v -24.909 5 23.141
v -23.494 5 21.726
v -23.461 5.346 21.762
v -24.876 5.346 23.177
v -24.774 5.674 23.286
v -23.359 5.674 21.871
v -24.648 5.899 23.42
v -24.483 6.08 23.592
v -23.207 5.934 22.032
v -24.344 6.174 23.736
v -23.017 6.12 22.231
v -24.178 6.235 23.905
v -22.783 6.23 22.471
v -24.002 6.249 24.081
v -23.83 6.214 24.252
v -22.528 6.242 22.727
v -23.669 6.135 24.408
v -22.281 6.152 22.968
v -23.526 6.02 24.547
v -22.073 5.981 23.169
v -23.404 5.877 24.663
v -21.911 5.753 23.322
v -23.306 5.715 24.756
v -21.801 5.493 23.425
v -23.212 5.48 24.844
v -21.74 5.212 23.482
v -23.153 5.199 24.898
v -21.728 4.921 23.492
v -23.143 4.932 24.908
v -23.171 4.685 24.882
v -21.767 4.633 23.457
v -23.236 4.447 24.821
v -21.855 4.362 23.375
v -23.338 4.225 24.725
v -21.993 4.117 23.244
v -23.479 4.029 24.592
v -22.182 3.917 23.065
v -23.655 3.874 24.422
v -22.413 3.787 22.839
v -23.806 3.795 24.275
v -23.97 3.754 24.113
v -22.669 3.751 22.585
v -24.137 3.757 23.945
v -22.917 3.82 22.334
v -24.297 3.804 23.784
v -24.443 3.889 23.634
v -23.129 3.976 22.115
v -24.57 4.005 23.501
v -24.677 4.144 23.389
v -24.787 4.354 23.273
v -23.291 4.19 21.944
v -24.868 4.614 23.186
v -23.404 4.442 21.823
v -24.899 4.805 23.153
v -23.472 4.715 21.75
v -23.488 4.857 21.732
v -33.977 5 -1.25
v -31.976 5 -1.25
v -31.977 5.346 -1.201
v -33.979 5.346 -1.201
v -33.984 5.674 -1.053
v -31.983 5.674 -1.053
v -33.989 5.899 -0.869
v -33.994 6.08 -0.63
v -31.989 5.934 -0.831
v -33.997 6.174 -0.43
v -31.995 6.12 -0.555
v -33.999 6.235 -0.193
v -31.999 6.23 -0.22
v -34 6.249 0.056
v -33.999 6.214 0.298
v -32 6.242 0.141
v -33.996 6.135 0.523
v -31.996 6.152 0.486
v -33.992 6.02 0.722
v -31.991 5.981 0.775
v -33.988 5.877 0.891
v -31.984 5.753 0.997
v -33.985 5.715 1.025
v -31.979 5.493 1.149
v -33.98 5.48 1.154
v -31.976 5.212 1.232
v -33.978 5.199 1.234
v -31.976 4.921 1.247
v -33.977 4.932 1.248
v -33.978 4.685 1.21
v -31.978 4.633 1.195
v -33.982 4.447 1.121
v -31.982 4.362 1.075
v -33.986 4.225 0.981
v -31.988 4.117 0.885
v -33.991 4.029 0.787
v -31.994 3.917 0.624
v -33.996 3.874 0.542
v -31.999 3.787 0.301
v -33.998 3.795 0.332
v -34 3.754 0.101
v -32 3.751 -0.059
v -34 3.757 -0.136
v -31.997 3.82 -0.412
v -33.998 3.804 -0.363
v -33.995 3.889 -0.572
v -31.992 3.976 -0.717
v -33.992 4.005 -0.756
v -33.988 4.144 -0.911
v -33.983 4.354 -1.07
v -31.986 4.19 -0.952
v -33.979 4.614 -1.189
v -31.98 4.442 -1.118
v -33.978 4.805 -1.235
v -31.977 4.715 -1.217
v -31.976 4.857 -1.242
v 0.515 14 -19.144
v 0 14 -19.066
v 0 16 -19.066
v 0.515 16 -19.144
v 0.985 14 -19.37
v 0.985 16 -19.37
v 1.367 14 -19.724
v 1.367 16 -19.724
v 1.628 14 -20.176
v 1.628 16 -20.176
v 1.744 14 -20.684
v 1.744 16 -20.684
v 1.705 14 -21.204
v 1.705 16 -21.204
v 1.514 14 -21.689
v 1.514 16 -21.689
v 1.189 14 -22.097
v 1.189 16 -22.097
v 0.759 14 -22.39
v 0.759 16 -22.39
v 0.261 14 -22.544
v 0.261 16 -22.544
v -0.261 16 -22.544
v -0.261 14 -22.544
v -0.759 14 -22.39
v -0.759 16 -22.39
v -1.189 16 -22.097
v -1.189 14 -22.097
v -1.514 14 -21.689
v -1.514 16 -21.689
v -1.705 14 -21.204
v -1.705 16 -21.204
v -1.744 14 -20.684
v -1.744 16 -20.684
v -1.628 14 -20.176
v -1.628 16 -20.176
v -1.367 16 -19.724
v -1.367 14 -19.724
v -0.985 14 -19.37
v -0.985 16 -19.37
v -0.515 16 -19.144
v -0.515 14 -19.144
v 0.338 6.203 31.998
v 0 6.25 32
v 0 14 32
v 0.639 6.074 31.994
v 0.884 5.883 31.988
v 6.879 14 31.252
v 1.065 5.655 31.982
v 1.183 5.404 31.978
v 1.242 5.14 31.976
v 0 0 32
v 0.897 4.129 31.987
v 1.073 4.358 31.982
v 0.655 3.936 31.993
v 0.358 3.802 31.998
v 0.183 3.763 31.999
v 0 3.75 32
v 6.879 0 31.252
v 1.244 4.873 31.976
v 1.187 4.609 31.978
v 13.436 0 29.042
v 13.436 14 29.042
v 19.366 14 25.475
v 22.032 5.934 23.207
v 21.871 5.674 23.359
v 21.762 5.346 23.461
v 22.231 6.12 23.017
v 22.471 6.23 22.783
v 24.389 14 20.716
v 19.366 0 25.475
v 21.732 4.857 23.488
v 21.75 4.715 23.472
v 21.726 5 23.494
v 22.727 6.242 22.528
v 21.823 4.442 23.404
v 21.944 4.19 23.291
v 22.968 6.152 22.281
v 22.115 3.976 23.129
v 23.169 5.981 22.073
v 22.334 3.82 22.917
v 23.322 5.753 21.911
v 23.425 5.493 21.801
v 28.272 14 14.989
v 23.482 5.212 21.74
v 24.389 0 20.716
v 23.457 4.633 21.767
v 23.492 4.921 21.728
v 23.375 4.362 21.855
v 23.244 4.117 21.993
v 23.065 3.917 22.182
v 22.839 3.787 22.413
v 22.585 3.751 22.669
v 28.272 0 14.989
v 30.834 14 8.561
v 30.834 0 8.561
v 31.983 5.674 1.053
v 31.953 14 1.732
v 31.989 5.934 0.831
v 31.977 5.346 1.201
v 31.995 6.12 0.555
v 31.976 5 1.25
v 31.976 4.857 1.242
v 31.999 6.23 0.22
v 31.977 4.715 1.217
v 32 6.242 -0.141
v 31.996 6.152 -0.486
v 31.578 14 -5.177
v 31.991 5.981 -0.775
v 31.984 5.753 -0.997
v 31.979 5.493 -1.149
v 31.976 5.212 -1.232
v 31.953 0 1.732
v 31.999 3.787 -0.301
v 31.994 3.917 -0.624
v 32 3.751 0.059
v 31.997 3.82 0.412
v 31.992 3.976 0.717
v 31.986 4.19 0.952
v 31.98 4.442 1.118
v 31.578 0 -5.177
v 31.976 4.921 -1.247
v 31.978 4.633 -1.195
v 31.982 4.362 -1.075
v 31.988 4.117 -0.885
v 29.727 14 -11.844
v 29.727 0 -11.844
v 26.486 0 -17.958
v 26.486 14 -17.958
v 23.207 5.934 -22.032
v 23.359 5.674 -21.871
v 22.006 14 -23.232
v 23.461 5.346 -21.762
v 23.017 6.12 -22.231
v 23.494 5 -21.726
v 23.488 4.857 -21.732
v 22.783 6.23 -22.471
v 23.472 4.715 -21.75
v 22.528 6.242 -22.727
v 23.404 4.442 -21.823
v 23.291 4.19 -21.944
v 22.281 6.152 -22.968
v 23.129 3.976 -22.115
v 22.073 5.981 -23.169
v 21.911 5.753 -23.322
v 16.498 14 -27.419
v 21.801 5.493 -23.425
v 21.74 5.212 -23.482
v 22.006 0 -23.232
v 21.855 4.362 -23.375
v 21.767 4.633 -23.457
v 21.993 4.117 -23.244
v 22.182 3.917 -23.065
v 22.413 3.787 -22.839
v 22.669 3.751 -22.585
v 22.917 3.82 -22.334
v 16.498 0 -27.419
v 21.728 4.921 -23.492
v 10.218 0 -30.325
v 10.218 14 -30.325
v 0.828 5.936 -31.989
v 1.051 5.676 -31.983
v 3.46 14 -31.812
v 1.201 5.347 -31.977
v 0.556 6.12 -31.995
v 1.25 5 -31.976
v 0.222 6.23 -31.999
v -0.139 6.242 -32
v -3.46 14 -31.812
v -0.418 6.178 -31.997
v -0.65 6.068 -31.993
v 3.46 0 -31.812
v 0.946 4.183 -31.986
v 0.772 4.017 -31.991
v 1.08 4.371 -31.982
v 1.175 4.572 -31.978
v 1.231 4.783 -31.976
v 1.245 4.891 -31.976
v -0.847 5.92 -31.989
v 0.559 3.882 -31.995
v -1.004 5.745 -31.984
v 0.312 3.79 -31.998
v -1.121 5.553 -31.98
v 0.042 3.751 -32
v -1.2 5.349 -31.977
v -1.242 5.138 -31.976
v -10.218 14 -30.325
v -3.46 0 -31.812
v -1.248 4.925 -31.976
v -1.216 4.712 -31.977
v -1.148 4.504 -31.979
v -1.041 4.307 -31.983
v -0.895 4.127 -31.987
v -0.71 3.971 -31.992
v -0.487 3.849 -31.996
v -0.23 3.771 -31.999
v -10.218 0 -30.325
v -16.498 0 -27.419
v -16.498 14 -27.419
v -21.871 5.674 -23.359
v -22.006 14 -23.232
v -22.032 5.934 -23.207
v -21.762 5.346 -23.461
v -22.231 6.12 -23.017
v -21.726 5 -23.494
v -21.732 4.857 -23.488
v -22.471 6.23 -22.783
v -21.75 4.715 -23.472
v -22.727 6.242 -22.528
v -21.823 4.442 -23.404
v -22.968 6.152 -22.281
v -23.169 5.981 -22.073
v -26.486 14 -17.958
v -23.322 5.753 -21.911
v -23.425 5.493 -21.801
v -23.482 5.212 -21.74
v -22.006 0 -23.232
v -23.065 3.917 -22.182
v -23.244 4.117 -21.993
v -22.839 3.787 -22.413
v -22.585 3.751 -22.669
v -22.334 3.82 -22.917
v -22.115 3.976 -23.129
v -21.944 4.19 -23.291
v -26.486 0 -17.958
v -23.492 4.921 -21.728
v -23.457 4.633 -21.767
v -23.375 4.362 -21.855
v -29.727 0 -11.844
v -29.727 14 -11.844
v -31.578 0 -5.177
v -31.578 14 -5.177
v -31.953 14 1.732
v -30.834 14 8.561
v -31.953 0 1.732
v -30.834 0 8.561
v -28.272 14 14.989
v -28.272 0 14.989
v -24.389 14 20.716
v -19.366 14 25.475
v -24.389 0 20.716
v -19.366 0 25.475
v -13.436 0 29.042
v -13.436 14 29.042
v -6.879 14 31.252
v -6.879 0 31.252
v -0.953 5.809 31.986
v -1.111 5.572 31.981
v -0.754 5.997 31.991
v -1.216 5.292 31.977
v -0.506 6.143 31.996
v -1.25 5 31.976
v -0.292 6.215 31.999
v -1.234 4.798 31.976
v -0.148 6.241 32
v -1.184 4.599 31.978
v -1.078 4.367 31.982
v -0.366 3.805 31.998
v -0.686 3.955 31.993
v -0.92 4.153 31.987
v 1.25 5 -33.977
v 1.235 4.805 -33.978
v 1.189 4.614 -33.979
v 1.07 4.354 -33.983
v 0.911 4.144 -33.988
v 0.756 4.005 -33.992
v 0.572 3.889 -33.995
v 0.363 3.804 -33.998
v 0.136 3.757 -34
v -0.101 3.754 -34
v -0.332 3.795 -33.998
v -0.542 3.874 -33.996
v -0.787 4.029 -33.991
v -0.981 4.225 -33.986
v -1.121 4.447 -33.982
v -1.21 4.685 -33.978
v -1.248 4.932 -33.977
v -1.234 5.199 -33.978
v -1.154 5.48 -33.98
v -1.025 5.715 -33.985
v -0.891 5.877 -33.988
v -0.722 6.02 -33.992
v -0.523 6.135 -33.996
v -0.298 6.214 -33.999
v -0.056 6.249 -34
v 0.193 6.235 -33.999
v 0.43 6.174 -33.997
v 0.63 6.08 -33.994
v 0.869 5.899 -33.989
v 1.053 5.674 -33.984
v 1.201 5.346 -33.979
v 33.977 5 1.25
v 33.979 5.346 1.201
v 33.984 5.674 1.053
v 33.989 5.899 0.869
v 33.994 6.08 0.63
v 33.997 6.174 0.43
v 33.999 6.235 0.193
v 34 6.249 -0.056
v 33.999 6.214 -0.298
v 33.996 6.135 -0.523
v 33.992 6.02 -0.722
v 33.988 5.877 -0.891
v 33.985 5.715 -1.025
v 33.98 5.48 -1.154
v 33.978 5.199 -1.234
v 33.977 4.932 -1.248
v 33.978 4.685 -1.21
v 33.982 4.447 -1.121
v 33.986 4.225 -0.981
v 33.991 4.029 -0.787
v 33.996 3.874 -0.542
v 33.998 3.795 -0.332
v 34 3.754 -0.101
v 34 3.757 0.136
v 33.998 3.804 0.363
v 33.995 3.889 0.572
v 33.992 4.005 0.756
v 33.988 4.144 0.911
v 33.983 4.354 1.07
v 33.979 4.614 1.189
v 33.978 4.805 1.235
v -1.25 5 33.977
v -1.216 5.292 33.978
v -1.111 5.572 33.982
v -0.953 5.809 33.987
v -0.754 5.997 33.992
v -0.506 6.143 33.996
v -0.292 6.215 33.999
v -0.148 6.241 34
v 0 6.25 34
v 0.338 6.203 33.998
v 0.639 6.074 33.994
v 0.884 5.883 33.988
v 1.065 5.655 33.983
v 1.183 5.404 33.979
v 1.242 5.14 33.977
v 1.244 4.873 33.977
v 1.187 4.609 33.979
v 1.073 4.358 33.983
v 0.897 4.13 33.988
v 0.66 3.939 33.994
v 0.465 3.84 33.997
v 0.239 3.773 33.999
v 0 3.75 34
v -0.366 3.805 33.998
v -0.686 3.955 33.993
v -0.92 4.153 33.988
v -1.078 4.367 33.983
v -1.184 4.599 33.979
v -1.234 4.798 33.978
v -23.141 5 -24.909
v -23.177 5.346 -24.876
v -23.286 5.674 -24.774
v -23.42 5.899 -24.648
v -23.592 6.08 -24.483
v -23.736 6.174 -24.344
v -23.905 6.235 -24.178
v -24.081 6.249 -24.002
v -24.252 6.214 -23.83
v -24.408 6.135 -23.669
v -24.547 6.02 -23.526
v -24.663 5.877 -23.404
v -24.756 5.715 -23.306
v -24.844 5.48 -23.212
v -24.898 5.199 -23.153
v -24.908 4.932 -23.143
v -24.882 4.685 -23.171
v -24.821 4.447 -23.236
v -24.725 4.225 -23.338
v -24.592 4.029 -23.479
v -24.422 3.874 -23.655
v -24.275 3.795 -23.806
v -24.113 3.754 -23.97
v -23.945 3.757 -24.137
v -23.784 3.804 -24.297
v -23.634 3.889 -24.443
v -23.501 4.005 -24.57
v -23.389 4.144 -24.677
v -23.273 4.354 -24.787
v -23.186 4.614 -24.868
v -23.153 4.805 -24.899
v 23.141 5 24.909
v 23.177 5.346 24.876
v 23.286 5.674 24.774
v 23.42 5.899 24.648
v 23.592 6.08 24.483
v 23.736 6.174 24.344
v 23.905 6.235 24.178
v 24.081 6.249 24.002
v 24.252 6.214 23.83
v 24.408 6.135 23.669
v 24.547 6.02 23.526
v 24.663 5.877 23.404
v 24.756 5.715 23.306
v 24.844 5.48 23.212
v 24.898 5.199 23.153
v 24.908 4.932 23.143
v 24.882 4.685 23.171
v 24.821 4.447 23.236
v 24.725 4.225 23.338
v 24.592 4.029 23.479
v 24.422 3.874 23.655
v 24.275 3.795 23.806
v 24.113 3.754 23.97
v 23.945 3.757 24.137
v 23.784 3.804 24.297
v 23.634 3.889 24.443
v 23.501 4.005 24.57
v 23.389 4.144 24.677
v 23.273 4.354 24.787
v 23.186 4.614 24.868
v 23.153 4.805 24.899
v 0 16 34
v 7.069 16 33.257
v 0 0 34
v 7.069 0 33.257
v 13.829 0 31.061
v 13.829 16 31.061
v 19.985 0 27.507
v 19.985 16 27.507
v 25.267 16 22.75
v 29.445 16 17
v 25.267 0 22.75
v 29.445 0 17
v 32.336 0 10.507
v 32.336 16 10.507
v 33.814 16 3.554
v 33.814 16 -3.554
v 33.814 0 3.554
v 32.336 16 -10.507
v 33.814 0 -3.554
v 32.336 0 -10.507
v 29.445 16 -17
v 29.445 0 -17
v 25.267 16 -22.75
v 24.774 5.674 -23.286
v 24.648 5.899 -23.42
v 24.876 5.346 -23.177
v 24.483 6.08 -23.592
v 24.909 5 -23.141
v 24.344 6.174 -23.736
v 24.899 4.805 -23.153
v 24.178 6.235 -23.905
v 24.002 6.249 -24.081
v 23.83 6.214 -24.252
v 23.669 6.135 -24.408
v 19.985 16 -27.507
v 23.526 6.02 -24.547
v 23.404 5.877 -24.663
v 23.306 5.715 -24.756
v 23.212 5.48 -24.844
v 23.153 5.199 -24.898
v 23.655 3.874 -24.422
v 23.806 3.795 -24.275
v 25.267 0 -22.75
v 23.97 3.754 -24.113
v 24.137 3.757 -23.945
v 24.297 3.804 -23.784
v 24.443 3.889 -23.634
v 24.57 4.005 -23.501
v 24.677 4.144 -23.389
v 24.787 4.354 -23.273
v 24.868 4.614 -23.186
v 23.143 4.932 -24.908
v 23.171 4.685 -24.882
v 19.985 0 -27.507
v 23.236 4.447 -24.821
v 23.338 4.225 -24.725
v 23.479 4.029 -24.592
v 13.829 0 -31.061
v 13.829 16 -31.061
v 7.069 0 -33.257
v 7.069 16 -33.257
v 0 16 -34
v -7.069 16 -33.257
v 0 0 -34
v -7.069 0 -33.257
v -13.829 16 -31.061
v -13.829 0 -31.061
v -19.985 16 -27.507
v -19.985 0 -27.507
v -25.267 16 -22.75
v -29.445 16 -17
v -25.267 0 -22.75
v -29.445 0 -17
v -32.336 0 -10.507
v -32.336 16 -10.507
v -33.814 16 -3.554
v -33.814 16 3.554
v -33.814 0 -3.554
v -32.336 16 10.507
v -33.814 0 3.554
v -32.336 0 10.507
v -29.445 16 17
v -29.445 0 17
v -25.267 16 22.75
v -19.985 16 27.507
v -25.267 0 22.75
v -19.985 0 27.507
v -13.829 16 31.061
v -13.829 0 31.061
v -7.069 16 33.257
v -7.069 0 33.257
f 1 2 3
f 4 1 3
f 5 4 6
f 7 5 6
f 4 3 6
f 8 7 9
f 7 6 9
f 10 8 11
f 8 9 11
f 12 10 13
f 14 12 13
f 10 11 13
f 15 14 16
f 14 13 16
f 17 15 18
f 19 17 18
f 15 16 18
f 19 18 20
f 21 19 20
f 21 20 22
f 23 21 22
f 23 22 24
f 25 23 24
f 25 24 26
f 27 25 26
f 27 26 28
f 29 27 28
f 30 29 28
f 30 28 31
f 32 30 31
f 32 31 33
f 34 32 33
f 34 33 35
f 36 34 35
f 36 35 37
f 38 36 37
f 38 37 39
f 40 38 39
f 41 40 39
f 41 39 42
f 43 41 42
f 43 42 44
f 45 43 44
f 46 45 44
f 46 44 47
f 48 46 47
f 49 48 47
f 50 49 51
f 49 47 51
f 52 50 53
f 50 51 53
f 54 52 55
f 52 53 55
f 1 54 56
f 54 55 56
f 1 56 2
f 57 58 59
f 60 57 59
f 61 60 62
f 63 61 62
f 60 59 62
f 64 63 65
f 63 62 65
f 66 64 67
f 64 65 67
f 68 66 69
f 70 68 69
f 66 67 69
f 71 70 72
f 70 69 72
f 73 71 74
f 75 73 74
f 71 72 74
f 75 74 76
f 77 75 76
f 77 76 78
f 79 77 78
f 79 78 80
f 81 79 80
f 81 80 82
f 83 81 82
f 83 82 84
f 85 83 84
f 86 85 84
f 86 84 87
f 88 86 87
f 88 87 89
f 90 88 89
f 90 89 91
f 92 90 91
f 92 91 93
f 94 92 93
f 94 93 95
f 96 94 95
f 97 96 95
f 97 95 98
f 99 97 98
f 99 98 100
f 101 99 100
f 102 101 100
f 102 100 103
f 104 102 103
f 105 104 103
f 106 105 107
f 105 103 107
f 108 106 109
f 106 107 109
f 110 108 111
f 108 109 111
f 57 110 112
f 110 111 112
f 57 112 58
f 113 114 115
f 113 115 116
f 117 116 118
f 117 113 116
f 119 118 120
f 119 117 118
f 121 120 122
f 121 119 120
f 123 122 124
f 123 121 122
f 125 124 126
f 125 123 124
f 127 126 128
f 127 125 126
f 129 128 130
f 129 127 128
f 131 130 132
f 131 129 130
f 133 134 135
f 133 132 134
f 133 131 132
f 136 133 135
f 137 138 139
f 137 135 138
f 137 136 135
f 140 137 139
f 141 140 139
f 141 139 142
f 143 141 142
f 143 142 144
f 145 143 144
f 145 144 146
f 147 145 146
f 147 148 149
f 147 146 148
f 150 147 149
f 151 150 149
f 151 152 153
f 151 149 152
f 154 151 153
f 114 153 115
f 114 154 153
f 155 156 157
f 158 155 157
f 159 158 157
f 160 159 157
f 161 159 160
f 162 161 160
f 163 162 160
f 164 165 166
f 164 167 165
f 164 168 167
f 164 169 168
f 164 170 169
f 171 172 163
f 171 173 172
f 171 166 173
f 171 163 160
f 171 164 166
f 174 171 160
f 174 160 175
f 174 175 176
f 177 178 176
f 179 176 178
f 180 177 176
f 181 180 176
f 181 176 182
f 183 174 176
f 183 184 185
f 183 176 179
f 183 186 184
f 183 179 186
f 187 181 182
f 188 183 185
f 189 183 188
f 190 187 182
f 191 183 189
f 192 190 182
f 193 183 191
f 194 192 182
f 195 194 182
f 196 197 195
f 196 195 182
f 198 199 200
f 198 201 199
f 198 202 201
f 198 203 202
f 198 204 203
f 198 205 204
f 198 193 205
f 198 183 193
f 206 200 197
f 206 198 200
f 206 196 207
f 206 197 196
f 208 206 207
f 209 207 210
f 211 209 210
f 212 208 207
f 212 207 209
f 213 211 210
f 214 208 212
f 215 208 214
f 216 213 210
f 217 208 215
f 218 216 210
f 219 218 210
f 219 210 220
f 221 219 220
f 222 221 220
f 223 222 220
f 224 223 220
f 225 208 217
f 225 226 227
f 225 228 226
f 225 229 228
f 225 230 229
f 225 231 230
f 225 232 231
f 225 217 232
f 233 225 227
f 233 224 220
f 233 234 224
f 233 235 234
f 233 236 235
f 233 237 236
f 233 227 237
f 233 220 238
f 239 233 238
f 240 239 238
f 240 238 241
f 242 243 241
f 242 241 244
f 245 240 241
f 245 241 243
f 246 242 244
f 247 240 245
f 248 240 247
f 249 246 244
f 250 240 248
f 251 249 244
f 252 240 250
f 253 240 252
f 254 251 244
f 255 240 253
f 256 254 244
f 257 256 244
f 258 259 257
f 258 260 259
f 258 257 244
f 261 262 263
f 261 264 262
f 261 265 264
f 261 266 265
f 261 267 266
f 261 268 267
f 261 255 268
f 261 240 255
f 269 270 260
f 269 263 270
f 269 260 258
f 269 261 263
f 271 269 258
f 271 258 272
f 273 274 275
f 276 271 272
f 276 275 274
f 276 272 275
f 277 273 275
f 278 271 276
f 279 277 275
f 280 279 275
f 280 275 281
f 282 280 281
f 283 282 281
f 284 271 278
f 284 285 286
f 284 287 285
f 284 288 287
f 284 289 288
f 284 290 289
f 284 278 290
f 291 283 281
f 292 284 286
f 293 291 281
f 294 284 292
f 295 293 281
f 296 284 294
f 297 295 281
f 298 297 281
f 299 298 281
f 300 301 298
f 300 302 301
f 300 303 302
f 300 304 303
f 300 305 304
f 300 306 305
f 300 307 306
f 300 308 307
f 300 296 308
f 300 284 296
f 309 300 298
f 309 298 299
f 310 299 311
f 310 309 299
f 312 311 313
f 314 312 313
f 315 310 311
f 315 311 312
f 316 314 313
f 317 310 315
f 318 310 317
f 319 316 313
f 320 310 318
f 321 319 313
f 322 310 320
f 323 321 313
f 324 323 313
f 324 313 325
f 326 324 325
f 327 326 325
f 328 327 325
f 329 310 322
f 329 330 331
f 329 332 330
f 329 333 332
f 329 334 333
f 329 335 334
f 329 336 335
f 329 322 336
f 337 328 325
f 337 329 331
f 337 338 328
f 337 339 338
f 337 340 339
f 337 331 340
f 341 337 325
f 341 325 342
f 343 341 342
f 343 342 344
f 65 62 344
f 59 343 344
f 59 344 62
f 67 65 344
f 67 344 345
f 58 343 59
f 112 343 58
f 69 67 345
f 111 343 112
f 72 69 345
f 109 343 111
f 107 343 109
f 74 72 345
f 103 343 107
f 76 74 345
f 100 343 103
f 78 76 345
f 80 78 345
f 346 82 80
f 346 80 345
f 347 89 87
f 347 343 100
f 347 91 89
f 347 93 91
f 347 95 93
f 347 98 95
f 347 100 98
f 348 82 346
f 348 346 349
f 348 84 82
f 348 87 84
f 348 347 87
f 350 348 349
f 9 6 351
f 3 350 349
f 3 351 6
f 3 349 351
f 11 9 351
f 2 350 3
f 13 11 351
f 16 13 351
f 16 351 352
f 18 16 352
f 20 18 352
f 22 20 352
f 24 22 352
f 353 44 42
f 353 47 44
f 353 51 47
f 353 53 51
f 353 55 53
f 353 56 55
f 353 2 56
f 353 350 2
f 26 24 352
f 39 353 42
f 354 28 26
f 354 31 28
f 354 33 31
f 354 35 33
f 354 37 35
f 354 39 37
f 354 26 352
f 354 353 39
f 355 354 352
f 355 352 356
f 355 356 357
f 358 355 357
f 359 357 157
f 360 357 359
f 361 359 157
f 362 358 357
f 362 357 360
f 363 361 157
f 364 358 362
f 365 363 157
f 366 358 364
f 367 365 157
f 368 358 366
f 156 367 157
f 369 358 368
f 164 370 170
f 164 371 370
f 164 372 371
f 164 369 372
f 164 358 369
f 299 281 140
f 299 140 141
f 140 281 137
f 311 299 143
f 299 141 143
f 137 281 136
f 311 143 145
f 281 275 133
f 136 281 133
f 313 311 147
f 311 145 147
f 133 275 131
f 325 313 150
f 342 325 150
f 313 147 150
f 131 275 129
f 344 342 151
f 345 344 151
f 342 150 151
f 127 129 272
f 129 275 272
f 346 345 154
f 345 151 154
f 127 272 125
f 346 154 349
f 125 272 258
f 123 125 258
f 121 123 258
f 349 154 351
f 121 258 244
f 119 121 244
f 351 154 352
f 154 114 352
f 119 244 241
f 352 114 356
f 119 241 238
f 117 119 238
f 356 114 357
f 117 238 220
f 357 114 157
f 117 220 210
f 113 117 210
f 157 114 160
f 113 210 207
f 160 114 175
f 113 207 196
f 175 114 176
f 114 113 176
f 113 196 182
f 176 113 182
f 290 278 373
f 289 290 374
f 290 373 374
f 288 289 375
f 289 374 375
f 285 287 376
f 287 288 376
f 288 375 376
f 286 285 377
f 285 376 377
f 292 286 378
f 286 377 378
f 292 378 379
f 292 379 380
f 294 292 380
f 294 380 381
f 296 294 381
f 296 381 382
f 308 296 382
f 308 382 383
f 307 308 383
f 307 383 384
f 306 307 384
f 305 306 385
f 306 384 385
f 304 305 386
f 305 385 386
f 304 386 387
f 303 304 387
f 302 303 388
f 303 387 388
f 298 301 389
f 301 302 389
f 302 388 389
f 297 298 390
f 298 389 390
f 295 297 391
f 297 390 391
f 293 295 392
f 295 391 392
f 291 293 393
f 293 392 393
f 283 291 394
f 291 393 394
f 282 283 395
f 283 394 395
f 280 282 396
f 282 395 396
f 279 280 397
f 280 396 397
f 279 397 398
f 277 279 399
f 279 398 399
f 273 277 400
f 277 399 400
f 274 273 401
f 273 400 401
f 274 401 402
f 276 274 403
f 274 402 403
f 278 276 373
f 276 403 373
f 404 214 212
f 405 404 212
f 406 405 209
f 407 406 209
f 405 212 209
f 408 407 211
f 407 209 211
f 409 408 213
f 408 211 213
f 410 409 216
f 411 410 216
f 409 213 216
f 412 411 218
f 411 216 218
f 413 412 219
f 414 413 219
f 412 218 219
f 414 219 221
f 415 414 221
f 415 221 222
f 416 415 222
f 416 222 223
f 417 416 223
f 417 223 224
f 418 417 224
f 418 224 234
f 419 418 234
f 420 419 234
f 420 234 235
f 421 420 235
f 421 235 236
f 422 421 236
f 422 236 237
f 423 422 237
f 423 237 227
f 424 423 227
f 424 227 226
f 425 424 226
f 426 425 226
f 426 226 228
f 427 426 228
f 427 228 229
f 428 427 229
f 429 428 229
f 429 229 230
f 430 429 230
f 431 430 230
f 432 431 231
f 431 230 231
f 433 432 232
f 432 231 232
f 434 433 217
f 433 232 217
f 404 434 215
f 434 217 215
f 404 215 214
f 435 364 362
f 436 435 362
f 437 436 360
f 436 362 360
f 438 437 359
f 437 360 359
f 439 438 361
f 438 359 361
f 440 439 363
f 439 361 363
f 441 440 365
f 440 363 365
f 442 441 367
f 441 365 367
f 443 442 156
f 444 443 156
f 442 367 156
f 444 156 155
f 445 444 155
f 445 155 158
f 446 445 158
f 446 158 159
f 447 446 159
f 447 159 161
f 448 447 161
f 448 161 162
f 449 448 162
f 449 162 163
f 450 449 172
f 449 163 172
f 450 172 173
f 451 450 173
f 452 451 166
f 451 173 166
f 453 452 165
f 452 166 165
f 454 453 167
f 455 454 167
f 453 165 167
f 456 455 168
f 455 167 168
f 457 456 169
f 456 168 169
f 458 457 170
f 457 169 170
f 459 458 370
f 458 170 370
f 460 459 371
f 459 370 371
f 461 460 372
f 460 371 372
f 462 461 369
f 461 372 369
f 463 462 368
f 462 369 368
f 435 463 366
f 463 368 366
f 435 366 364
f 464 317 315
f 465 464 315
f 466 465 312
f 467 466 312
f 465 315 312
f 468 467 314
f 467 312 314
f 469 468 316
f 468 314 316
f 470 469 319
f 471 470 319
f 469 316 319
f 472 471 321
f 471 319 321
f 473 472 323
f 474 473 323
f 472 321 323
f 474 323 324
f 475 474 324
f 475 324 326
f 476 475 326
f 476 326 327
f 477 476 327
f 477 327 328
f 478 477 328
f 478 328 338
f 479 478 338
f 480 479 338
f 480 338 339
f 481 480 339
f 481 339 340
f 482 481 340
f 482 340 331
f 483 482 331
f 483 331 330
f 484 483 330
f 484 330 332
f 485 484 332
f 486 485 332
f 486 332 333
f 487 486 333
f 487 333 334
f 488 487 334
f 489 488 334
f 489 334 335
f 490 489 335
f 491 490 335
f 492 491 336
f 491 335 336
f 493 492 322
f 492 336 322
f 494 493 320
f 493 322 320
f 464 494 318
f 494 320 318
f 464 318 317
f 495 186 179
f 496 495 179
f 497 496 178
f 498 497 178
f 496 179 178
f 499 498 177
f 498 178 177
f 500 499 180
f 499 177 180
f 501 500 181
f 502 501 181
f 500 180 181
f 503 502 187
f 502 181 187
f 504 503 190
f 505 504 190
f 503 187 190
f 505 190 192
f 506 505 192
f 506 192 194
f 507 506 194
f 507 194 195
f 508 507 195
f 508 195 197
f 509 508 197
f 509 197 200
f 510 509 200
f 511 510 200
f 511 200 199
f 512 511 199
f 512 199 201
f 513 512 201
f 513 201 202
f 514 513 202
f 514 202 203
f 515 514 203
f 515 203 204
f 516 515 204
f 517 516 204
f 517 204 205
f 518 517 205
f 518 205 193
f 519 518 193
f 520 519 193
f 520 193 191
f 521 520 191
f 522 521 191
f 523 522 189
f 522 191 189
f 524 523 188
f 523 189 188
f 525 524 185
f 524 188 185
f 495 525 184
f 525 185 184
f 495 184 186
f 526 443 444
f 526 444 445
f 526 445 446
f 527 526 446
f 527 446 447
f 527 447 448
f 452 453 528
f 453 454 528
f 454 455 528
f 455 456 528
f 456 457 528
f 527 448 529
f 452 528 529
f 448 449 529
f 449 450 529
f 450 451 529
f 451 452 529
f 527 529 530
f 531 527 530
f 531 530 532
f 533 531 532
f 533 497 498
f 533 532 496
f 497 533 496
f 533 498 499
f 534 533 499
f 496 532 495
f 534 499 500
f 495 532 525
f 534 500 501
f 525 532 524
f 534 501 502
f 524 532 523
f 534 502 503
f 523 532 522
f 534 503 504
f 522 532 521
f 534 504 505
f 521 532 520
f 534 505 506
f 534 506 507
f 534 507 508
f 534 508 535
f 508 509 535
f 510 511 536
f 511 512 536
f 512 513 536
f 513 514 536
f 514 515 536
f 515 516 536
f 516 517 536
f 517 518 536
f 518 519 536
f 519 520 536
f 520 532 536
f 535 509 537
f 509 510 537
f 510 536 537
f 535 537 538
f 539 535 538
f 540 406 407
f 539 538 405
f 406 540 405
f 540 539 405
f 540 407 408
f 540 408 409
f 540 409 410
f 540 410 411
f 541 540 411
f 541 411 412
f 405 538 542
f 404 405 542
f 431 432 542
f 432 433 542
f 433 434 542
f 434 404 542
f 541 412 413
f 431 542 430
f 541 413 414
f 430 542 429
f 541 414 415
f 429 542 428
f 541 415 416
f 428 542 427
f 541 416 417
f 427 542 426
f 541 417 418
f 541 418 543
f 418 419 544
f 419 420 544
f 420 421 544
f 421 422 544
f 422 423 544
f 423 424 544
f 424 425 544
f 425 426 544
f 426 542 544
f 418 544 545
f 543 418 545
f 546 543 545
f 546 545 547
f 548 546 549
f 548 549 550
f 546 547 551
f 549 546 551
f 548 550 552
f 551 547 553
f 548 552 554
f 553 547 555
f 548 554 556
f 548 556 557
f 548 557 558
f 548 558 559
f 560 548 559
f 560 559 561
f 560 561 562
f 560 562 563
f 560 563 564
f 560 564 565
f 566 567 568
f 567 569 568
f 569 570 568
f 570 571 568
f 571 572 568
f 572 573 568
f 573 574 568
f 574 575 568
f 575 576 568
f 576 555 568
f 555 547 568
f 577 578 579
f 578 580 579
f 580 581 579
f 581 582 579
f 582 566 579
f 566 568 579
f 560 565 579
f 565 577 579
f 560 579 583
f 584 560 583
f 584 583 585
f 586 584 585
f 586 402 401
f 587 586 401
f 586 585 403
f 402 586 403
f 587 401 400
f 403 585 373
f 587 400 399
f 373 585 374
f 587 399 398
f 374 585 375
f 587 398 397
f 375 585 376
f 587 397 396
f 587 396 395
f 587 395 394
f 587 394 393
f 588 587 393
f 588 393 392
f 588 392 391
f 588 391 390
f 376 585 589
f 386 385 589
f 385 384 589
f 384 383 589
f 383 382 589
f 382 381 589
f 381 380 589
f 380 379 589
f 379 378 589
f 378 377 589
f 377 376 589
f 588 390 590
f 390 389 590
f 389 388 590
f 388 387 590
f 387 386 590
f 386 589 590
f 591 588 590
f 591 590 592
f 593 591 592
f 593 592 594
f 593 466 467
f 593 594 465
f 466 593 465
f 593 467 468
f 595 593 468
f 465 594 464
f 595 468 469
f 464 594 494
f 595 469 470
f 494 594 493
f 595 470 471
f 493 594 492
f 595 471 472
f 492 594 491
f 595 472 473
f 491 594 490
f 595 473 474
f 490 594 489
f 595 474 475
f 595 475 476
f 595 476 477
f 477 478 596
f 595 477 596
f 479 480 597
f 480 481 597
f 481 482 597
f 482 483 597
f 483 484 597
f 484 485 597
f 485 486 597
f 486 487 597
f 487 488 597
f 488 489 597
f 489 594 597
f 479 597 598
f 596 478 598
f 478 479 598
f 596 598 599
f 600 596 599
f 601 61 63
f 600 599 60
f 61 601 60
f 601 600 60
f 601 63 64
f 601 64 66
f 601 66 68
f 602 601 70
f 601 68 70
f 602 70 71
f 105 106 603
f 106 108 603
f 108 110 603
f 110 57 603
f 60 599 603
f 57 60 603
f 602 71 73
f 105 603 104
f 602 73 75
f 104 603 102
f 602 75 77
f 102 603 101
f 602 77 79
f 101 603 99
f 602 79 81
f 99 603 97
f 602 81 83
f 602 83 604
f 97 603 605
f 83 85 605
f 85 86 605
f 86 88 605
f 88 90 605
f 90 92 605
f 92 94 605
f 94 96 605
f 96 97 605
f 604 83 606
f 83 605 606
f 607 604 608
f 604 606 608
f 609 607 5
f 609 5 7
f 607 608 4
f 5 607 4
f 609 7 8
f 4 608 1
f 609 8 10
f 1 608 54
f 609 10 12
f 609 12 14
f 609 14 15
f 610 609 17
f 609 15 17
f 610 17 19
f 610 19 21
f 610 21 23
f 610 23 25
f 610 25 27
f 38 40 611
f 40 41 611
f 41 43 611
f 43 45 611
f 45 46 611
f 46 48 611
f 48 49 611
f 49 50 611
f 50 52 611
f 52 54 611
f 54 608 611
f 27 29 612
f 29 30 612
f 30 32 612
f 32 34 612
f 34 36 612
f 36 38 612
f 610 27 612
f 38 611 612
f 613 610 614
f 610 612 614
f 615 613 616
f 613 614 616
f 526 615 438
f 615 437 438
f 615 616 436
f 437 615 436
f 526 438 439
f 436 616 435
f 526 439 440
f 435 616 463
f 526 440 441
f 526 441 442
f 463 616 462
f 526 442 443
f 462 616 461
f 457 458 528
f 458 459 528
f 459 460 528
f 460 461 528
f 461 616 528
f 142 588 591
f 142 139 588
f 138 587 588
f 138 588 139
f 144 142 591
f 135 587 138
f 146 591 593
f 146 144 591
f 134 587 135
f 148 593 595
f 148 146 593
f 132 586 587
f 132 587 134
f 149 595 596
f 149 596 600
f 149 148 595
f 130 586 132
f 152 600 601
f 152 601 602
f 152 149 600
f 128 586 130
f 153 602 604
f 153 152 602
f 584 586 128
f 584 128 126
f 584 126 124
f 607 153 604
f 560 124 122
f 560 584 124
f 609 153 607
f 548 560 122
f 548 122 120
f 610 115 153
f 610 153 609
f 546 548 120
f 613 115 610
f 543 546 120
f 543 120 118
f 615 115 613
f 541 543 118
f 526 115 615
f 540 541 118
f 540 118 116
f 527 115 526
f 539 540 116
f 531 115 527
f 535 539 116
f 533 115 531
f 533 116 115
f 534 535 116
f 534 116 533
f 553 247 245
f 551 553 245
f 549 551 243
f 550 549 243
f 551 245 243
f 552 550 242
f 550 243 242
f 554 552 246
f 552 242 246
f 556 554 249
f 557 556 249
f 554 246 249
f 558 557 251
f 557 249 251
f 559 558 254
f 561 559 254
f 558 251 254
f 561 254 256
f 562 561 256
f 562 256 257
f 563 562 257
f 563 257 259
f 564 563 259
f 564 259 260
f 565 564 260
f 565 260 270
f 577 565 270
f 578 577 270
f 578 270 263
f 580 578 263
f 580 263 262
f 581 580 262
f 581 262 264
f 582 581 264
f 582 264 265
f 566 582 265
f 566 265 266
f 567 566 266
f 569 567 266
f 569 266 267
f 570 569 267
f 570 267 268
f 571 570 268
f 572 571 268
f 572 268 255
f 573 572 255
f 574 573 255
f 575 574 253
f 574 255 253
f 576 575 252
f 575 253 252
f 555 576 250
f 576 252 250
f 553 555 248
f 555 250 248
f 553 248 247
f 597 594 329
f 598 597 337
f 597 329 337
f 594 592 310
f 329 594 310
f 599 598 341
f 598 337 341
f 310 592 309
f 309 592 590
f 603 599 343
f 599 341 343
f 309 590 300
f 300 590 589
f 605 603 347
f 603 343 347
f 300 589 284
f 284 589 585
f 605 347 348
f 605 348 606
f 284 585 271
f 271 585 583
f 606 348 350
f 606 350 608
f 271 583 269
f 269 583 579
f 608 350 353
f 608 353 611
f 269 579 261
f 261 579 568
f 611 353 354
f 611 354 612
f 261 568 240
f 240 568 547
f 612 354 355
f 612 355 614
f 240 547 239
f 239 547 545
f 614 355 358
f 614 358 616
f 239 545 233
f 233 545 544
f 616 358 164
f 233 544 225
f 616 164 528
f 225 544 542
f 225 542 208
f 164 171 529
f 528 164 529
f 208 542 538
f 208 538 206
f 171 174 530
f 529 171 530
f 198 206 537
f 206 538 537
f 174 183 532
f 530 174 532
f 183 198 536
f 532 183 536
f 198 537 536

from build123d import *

# Parameters (mm, degrees)
SKETCH_1_R               = 34
EXTRUDE_1_DEPTH          = 16
CUT_EXTRUDE_1_REACH      = 52.675
CUT_EXTRUDE_1_END_RADIUS = 34
SKETCH_2_R               = 1.25
PATTERN_CIRCULAR_1_COUNT = 8
SKETCH_3_R               = 32
CUT_EXTRUDE_2_DEPTH      = 14
SKETCH_5_R               = 1.748779673
CUT_EXTRUDE_3_DEPTH      = 51.675438003


with BuildPart() as part:
    # 草图1 → 凸台-拉伸1 (new body)
    with BuildSketch(Plane(origin=(0, 0, 0), x_dir=(1, 0, 0), z_dir=(0, 1, 0))):
        with Locations(Location((0, 0, 0), (0, 0, 270))):
            Circle(SKETCH_1_R)
    extrude(amount=EXTRUDE_1_DEPTH)

    # 切除-拉伸1: up to this cylinder (the profile starts inside it)
    cut_extrude_1_end = Plane(origin=(0, 5, 0), z_dir=(0, -1, 0)) * Cylinder(CUT_EXTRUDE_1_END_RADIUS, 174.35, mode=Mode.PRIVATE)
    # 草图2 → 切除-拉伸1 (cut, up to the surface)
    with BuildSketch(Plane.XY, mode=Mode.PRIVATE) as cut_extrude_1_sk1:
        with Locations((0, 5)):
            Circle(SKETCH_2_R)
    cut_extrude_1_tool1 = extrude(cut_extrude_1_sk1.sketch, amount=-CUT_EXTRUDE_1_REACH, mode=Mode.PRIVATE) & cut_extrude_1_end
    cut_extrude_1 = cut_extrude_1_tool1.solids().sort_by_distance((0, 5, 0))[0]
    add(cut_extrude_1, mode=Mode.SUBTRACT)

    # 阵列(圆周)1: 切除-拉伸1 ×8 about axis
    pattern_circular_1_axis = Axis((0, 16, 0), (0, 1, 0))
    for i in range(1, PATTERN_CIRCULAR_1_COUNT):
        add(cut_extrude_1.rotate(pattern_circular_1_axis, i * 360 / PATTERN_CIRCULAR_1_COUNT), mode=Mode.SUBTRACT)

    # 草图3 → 切除-拉伸2 (cut)
    with BuildSketch(Plane(origin=(0, 0, 0), x_dir=(1, 0, 0), z_dir=(0, 1, 0))):
        with Locations(Location((0, 0, 0), (0, 0, 270))):
            Circle(SKETCH_3_R)
    extrude(amount=CUT_EXTRUDE_2_DEPTH, mode=Mode.SUBTRACT)

    # 草图5 → 切除-拉伸3 (cut, through all)
    with BuildSketch(Plane(origin=(0, 0, 0), x_dir=(1, 0, 0), z_dir=(0, 1, 0))):
        with Locations(Location((0, 20.814842856, 0), (0, 0, 270))):
            Circle(SKETCH_5_R)
    extrude(amount=CUT_EXTRUDE_3_DEPTH, mode=Mode.SUBTRACT)


solid = part.part
